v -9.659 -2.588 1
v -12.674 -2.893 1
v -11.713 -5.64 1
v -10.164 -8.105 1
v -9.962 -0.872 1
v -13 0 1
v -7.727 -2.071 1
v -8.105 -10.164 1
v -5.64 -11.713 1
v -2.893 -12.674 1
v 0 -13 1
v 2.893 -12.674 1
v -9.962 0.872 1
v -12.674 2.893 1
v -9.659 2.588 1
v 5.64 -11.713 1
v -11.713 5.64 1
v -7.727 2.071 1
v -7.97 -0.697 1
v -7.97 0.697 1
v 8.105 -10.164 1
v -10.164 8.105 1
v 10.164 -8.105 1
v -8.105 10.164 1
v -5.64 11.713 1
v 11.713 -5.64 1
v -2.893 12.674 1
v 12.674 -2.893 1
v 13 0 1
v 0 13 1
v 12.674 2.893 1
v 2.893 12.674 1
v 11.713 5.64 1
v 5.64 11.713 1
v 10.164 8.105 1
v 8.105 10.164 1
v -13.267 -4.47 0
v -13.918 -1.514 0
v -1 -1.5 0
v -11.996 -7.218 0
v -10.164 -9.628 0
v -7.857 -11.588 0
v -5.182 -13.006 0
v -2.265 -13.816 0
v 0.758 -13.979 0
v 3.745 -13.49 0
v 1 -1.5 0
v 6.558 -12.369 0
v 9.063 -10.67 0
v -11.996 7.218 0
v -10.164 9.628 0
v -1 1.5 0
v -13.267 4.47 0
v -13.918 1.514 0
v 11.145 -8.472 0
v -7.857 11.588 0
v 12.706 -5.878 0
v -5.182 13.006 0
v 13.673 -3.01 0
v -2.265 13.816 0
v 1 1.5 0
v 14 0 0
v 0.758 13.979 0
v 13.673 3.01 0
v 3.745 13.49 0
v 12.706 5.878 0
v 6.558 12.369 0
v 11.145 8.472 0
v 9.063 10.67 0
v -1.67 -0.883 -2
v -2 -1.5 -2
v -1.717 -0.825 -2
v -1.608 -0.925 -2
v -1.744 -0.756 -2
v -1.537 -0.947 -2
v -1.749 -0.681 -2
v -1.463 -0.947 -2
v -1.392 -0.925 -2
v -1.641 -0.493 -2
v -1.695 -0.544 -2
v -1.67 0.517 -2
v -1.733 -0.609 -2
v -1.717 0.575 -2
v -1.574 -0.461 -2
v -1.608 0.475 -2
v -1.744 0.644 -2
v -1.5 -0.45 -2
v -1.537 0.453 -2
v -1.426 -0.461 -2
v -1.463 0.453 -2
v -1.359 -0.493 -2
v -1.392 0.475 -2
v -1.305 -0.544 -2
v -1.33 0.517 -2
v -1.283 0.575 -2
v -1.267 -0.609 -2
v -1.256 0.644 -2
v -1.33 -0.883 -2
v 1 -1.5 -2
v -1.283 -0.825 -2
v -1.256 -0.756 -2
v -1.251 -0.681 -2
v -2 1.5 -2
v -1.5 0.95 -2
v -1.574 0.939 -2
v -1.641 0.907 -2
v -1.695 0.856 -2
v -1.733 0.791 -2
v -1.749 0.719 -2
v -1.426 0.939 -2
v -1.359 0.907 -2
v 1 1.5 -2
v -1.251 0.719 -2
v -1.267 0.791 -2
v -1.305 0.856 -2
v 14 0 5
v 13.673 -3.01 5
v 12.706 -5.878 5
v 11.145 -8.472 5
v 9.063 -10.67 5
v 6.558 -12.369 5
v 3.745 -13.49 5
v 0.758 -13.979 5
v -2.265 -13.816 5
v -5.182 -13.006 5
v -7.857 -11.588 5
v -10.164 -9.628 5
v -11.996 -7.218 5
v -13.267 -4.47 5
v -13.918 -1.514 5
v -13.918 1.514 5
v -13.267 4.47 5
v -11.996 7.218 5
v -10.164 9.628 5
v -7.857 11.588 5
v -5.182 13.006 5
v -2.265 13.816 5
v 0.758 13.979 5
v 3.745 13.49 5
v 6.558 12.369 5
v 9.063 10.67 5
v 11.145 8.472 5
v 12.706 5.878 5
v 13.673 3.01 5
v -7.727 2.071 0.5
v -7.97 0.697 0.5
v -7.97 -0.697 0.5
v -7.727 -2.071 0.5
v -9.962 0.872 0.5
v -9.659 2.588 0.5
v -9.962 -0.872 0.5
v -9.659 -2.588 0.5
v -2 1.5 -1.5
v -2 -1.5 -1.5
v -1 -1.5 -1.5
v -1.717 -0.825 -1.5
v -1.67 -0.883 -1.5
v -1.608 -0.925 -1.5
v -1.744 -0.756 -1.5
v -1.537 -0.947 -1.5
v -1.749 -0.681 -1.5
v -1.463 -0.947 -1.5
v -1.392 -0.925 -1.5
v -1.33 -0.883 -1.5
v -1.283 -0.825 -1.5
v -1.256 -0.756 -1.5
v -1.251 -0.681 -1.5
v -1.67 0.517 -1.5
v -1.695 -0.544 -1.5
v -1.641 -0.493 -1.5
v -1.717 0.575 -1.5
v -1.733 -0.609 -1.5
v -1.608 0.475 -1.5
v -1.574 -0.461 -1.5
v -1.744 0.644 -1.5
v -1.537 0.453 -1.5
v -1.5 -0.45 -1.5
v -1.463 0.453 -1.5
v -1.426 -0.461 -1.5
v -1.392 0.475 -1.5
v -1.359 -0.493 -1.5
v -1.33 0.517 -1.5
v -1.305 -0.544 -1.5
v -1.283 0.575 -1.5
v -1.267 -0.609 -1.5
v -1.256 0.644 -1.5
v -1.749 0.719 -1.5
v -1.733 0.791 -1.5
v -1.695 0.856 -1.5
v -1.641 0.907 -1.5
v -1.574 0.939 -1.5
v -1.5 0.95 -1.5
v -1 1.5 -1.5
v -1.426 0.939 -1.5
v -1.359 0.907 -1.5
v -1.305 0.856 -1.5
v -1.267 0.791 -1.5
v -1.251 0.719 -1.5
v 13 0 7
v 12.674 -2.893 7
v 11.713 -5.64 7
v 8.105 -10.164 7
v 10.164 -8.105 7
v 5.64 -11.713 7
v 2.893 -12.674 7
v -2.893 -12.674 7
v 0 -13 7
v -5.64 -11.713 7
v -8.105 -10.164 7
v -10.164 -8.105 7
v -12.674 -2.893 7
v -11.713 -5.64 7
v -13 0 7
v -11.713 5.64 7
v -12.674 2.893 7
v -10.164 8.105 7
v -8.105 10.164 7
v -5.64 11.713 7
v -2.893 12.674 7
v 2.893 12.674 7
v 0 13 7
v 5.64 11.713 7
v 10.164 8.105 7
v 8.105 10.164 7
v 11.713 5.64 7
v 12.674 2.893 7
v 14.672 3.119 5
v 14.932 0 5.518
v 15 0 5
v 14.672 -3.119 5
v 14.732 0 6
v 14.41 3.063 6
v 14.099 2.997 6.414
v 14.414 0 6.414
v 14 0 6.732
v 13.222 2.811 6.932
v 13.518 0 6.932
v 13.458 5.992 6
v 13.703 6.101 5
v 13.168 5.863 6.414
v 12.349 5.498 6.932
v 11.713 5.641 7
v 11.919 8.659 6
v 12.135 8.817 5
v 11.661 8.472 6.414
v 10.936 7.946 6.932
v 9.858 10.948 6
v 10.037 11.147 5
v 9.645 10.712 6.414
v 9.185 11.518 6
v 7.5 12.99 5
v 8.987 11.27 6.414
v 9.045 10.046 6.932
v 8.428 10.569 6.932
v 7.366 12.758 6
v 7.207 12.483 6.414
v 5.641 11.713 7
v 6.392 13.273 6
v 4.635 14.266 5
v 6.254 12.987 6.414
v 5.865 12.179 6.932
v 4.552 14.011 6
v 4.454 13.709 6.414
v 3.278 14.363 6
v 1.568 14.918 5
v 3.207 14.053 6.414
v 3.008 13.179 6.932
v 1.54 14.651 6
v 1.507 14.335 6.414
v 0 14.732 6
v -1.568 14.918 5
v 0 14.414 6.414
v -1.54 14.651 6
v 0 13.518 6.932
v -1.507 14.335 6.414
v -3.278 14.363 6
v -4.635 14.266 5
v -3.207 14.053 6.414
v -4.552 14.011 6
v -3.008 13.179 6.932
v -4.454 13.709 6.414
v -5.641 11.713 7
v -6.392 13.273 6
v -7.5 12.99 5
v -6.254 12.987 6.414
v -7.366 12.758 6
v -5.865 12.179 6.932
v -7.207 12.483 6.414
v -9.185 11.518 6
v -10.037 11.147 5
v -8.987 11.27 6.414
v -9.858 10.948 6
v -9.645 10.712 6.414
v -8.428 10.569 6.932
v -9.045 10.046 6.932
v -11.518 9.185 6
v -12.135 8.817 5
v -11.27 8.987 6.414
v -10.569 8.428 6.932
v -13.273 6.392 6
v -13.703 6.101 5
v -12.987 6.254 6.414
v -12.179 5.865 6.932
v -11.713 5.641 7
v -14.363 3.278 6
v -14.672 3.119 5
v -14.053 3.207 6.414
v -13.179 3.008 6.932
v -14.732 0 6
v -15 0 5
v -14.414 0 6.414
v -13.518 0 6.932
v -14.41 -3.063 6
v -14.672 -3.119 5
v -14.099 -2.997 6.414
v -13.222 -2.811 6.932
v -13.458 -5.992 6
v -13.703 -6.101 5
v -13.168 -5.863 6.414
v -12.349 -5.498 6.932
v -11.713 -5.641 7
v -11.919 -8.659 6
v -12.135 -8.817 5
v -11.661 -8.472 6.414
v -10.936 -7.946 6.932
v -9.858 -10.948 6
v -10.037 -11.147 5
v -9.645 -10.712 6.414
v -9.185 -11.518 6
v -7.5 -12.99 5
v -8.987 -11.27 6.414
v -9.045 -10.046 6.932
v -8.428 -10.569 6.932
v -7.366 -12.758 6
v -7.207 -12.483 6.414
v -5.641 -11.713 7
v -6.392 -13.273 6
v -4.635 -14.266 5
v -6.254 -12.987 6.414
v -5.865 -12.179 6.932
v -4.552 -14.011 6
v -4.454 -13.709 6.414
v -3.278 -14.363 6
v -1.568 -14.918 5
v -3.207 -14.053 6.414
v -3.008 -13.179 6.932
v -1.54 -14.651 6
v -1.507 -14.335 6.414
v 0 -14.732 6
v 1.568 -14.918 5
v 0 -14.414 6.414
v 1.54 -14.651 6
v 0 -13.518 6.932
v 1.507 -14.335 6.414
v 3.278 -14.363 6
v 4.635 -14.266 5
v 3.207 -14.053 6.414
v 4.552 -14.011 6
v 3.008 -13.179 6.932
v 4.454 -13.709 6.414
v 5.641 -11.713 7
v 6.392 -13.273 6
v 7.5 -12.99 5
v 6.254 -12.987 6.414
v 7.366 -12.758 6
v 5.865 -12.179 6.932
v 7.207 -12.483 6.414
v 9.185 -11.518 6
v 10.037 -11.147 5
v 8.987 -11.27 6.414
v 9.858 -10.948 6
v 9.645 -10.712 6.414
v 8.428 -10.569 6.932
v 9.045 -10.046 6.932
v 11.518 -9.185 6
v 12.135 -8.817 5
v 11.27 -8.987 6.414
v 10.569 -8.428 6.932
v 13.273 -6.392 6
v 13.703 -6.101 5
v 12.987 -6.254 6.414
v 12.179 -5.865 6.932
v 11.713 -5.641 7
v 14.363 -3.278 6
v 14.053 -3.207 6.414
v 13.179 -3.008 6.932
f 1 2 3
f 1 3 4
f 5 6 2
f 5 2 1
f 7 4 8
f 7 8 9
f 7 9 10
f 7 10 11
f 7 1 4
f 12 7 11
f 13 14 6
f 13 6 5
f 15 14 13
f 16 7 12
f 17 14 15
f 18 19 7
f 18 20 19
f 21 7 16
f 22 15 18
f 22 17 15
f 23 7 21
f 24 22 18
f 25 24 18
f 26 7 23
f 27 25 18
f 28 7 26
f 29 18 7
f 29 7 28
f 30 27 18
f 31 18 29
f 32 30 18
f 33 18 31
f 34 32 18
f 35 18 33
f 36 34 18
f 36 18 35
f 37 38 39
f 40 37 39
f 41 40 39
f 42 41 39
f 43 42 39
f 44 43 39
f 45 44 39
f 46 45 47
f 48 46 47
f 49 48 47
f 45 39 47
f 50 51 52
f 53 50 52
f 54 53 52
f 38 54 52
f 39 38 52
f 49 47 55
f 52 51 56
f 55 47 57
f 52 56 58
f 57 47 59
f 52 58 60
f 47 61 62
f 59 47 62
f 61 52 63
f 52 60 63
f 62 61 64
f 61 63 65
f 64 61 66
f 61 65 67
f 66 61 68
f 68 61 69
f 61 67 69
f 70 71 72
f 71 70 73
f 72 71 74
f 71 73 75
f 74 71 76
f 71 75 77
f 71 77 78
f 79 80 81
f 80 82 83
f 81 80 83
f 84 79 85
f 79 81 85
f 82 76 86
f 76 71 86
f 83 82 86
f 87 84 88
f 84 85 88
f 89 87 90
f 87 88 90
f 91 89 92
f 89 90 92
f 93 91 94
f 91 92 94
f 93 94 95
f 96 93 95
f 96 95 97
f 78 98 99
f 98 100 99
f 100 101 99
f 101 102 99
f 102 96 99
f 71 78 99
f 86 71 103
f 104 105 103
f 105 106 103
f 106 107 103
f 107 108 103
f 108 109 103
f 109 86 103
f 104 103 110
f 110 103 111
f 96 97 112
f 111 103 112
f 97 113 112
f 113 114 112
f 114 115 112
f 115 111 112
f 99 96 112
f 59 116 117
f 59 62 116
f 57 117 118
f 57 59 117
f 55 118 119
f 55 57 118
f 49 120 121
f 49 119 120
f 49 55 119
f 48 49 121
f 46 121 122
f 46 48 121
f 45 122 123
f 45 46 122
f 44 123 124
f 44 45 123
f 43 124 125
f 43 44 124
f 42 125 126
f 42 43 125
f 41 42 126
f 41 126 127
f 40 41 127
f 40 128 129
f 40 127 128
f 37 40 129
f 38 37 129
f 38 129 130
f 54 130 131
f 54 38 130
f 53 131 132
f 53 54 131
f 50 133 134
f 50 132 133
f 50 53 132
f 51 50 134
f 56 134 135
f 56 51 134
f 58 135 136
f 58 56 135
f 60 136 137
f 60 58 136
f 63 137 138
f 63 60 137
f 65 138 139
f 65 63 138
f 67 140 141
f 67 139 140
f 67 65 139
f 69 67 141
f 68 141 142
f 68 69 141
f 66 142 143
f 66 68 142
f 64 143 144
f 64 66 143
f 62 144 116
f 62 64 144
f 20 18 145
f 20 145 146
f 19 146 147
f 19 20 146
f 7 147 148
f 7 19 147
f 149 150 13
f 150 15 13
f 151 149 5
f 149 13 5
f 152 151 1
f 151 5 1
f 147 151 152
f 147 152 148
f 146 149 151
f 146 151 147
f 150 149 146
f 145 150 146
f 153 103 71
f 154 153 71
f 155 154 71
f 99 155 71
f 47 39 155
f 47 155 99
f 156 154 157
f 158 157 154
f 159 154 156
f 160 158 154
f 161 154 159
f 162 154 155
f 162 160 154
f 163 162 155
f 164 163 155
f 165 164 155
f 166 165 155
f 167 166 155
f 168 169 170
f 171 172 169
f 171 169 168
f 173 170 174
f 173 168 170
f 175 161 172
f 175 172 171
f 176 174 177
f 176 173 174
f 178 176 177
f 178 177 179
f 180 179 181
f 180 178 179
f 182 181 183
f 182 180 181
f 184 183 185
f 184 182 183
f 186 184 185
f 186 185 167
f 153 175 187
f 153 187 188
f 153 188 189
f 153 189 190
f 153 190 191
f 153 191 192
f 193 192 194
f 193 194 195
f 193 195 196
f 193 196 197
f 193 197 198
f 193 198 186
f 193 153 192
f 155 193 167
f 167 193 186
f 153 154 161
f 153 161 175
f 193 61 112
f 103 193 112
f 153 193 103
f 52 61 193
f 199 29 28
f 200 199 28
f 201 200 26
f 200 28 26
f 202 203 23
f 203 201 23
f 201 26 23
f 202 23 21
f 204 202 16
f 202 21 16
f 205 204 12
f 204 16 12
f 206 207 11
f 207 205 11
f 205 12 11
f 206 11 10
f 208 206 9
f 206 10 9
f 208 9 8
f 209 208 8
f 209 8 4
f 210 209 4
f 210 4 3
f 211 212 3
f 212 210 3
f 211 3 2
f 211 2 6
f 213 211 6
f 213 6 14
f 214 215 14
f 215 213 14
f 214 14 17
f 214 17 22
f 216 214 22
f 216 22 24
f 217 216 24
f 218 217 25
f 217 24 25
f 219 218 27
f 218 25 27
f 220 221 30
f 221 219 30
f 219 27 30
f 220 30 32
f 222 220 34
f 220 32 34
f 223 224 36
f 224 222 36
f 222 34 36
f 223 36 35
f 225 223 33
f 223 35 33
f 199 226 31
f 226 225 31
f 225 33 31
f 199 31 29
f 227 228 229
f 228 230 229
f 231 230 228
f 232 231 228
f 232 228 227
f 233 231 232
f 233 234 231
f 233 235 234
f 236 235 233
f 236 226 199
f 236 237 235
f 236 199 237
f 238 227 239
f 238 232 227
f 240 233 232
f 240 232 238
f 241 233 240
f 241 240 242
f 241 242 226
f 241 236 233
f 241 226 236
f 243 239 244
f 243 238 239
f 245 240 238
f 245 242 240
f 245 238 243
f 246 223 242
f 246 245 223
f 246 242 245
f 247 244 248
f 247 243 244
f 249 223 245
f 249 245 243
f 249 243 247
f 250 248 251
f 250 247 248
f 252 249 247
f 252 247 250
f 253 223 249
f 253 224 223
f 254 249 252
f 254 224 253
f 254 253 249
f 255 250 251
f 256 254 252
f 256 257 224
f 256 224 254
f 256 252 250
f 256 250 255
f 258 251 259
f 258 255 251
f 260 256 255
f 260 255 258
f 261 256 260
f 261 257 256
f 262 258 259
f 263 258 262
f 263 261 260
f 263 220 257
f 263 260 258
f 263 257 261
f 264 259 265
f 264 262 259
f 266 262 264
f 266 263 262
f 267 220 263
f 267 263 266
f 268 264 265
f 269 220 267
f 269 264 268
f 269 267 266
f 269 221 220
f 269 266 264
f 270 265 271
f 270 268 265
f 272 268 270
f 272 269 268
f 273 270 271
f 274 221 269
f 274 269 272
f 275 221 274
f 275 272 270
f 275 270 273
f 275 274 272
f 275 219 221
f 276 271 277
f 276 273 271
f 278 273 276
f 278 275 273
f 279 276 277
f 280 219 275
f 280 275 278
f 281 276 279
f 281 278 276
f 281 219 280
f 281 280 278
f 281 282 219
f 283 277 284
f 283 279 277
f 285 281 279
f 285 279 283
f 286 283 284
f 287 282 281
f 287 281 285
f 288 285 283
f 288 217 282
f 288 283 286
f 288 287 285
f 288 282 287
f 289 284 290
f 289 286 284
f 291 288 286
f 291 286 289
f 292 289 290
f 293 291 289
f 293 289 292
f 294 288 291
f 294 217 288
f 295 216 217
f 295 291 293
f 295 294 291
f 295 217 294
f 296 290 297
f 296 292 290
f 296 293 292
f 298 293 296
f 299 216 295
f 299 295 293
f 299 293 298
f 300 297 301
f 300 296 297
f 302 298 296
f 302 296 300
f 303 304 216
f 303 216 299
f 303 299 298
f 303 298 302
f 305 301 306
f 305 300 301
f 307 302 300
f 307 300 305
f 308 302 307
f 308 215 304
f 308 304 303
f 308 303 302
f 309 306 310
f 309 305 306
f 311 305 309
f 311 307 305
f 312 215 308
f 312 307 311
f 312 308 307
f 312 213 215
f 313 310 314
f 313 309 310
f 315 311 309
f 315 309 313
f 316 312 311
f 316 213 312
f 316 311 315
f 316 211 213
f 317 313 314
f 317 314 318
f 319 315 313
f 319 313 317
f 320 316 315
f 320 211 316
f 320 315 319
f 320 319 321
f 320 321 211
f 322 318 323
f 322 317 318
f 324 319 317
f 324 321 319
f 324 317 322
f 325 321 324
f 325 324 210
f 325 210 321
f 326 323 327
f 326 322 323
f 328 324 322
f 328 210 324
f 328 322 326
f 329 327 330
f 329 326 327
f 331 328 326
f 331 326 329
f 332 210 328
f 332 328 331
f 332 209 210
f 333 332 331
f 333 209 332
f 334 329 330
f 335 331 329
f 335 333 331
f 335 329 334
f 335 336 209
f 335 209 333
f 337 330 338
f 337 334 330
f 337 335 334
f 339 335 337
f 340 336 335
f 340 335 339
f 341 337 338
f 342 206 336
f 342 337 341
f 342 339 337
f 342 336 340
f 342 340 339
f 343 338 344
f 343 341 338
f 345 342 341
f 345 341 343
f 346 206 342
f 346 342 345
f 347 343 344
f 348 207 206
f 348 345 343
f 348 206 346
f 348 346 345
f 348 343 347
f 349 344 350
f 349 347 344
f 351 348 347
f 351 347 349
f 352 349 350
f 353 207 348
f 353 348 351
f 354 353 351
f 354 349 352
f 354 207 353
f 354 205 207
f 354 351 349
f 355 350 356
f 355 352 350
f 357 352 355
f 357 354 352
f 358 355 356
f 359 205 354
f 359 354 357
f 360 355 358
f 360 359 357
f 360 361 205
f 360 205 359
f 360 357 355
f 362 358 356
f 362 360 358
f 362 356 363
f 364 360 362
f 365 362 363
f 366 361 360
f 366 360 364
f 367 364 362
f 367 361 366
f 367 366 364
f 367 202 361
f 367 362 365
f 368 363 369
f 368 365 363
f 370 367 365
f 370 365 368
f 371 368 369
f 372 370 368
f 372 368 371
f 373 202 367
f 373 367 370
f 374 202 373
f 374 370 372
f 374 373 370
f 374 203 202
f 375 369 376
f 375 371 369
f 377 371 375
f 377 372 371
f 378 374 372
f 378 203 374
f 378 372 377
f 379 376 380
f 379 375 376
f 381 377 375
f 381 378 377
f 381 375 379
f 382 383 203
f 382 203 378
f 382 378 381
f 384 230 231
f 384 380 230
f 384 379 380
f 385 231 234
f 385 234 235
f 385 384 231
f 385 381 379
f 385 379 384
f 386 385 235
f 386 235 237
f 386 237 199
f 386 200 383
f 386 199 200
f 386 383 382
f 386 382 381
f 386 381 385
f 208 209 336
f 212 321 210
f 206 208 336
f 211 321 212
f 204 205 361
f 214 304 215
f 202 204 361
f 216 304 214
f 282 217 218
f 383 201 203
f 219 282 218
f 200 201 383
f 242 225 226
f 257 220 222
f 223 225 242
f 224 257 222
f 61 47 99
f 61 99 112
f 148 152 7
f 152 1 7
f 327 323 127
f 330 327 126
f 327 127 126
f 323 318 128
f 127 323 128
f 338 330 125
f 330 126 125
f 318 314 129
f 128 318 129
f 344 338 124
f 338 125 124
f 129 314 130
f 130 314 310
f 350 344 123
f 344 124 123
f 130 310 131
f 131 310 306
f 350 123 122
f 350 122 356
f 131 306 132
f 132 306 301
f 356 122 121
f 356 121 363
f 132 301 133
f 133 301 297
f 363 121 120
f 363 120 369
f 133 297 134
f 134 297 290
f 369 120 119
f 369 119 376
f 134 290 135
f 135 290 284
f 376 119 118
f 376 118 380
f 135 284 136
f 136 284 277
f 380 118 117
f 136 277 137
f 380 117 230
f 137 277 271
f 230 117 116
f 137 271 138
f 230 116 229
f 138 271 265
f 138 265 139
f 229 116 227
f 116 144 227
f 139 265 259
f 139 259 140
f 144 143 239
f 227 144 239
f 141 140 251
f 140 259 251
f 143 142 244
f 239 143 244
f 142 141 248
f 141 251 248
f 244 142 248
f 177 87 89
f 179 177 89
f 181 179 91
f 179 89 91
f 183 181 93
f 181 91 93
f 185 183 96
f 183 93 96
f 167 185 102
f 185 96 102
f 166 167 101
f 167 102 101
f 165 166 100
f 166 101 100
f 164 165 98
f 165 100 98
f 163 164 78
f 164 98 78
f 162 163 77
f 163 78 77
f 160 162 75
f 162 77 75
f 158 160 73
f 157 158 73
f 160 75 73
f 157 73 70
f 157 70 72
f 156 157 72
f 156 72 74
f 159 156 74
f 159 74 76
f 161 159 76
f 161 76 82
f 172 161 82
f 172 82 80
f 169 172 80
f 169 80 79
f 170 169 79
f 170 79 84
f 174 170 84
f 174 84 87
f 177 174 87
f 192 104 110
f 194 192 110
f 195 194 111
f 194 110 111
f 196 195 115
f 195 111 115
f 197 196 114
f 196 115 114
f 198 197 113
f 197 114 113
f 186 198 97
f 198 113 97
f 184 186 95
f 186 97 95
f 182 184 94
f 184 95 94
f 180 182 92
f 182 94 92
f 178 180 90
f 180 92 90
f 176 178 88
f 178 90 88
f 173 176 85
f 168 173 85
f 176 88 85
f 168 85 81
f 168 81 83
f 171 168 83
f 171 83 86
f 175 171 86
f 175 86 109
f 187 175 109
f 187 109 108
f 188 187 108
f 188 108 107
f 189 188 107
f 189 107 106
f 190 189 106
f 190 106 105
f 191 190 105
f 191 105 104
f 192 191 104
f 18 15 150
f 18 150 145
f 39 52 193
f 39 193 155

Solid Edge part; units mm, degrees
sketch "Sketch1" plane through (0, 0, 0) normal (0, 0, 1) x (1, 0, 0)
  circle A0 centre (0, 0) radius 14
extrude "Protrusion1" add sketch "Sketch1" along normal blind 1
sketch "Sketch2" plane through (0, 0, 1) normal (0, 0, 1) x (1, 0, 0)
  circle A0 centre (0, 0) radius 13
  circle A1 centre (0, 0) radius 14
extrude "Wall" add sketch "Sketch2" along normal blind 4
sketch "Sketch3" plane through (0, 0, 5) normal (0, 0, 1) x (1, 0, 0)
  circle A0 centre (0, 0) radius 15
  circle A1 centre (0, 0) radius 13
extrude "Top" add sketch "Sketch3" along normal blind 2
fillet "Round___Top" radius 2 1 edges at (-15, 0, 7)
sketch "Sketch4" plane through (0, 0, 1) normal (0, 0, 1) x (1, 0, 0)
  line L0 (-9.6593, -2.5882) -> (-7.7274, -2.0706)
  line L1 (-9.6593, 2.5882) -> (-7.7274, 2.0706)
  arc A0 (-9.6593, 2.5882) -> (-9.6593, -2.5882) centre (0, 0) ccw
  arc A1 (-7.7274, -2.0706) -> (-7.7274, 2.0706) centre (0, 0) cw
extrude "Cutout___Alignment" cut sketch "Sketch4" against normal blind 0.5
sketch "Sketch5" plane through (0, 0, 0) normal (0, 0, -1) x (1, 0, 0)
  line L0 (1, -1.5) -> (-1, -1.5)
  line L1 (-1, -1.5) -> (-1, 1.5)
  line L2 (-1, 1.5) -> (1, 1.5)
  line L3 (1, 1.5) -> (1, -1.5)
  dimension "D1" = 2
  dimension "D2" = 3
extrude "Electrics" add sketch "Sketch5" along normal blind 2
sketch "Sketch6" plane through (0, 0, -2) normal (0, 0, -1) x (1, 0, 0)
  line L0 (-1, -1.5) -> (-2, -1.5)
  line L1 (-2, -1.5) -> (-2, 1.5)
  line L2 (-2, 1.5) -> (-1, 1.5)
  line L3 (-1, -1.5) -> (-1, 1.5)
  dimension "D1" = 1
extrude "Wires" add sketch "Sketch6" against normal blind 0.5
hole "Hole1" at (-1.5, -0.7, -2) direction (0, 0, 1) diameter 0.5 end up to next
hole "Hole2" at (-1.5, 0.7, -2) direction (0, 0, 1) diameter 0.5 end up to next
properties material "ABS Plastic, high impact"
